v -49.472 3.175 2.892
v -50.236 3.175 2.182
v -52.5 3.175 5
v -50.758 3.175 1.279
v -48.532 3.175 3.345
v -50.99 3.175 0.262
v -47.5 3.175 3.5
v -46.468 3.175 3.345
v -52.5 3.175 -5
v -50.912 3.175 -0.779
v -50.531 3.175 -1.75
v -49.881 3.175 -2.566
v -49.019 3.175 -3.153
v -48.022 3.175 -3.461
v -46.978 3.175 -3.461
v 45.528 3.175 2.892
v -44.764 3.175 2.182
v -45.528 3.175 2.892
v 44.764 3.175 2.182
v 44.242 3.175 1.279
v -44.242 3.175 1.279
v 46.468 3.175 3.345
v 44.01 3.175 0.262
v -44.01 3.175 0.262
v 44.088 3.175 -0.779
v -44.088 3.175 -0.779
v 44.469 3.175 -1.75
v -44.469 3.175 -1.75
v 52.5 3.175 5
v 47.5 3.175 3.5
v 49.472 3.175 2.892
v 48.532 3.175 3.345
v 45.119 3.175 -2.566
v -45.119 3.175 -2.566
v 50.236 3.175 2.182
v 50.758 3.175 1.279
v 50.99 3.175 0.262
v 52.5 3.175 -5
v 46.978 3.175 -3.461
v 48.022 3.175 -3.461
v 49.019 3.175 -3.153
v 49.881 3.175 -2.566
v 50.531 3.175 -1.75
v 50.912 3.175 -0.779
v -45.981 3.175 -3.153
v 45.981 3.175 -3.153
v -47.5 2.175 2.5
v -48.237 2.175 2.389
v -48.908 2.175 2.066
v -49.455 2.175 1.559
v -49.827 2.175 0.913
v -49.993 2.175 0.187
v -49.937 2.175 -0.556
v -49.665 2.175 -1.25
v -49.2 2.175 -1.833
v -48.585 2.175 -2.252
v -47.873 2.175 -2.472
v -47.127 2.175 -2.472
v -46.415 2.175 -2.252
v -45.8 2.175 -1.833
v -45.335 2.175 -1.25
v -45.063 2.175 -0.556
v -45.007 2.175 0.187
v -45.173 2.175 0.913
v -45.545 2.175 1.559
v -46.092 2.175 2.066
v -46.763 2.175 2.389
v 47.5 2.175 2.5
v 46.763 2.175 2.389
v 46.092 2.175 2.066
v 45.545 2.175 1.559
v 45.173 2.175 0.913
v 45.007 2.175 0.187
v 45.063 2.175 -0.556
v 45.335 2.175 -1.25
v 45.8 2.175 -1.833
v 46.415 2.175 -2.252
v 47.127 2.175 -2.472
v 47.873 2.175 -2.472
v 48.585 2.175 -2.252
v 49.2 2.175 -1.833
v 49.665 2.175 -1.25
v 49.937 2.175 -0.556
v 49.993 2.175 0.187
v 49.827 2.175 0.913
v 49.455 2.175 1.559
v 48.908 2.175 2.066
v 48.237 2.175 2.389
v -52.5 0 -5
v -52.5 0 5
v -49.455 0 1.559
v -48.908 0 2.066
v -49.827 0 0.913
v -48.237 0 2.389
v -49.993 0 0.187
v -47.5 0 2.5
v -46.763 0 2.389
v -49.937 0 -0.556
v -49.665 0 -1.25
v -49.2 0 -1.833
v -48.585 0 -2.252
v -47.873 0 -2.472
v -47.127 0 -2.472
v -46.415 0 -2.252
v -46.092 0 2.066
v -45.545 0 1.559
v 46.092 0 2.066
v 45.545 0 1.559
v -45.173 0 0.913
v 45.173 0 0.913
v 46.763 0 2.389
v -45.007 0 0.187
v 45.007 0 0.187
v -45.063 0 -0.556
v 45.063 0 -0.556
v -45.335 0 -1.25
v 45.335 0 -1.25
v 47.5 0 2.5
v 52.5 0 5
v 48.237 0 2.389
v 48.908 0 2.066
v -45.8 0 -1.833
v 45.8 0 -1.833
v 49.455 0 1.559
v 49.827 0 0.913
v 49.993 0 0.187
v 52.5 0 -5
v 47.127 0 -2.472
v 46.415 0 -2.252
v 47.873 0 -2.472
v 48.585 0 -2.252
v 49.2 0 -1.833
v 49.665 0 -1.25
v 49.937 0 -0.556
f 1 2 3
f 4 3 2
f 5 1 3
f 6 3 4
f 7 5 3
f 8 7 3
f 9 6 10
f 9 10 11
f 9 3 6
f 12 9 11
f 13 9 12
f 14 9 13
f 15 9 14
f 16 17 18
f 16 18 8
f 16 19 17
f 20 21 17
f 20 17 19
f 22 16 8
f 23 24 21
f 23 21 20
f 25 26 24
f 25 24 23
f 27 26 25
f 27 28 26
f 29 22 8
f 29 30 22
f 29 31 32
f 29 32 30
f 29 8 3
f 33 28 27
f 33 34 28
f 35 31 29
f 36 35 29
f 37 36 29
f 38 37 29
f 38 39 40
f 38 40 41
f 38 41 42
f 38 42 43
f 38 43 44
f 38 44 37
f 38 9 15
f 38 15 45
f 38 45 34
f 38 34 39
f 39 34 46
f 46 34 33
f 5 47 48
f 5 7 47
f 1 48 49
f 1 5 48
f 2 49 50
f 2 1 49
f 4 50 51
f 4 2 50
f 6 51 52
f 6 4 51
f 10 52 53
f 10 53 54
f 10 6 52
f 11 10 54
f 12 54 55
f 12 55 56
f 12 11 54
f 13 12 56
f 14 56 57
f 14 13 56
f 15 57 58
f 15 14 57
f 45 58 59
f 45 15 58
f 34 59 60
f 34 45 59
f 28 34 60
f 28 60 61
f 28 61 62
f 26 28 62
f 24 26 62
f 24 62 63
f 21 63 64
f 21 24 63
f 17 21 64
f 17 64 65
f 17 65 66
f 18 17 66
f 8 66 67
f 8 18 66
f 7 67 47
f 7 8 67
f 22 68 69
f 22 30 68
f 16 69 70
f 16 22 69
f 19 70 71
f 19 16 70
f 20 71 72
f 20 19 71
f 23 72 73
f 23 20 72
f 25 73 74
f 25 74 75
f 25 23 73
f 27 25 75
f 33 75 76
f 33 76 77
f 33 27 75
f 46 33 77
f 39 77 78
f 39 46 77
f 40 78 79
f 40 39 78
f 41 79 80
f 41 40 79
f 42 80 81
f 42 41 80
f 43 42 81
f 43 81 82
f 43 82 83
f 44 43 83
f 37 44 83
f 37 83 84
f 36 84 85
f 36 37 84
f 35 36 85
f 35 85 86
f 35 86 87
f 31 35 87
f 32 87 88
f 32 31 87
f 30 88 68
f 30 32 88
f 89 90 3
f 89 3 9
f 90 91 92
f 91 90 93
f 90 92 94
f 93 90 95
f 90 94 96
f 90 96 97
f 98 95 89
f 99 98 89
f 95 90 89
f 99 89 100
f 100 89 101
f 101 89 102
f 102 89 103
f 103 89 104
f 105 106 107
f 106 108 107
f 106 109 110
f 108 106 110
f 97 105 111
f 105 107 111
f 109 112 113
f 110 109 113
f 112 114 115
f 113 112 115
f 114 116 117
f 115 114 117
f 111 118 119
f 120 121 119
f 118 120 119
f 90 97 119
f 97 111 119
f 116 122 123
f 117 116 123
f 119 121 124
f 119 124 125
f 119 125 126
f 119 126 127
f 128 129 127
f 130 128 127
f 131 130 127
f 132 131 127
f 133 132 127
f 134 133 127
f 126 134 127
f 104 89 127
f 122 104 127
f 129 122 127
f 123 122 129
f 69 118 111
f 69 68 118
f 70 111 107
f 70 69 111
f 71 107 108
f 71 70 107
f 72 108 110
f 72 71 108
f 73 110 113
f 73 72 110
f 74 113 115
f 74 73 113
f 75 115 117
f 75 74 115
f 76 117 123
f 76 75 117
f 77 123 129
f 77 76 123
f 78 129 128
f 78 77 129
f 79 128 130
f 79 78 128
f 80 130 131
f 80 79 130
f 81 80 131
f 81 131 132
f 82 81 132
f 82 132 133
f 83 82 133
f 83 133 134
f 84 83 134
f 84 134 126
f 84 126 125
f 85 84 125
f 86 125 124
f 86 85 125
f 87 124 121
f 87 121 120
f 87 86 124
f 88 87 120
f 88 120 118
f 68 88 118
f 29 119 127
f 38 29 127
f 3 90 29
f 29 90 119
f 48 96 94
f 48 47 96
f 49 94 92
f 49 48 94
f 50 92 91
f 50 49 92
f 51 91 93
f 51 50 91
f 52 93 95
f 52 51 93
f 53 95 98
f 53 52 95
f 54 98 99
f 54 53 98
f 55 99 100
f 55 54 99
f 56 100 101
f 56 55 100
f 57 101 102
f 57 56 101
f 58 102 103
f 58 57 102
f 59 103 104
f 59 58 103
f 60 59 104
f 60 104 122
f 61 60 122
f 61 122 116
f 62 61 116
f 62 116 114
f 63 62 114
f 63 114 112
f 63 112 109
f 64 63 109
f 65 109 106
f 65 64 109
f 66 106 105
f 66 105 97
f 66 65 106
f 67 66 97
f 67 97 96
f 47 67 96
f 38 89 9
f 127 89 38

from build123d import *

# Parameters (mm, degrees)
SKETCH1_W                      = 105
SKETCH1_H                      = 10
BOSS_EXTRUDE1_DEPTH            = 3.175
M6X1_0_TAPPED_HOLE1_AT_2_COUNT = 2
M6X1_0_TAPPED_HOLE1_AT_2_PITCH = 95


with BuildPart() as part:
    # Sketch1 → Boss-Extrude1 (new body)
    with BuildSketch(Plane(origin=(0, 0, 0), x_dir=(1, 0, 0), z_dir=(0, 1, 0))):
        Rectangle(SKETCH1_W, SKETCH1_H)
    extrude(amount=BOSS_EXTRUDE1_DEPTH)

    # Sketch4 → M6x1.0 Tapped Hole1 (revolve, cut)
    with BuildSketch(Plane(origin=(47.5, 3.175, 0), x_dir=(0, 0, 1), z_dir=(1, 0, 0))):
        Polygon((0, 0), (0, 3.175), (2.5, 3.175), (2.5, 1), (3.5, 0), align=None)
    m6x1_0_tapped_hole1 = revolve(axis=Axis((47.5, 9.525, 0), (0, -1, 0)), mode=Mode.SUBTRACT)

    # M6x1.0 Tapped Hole1 at 2: M6x1.0 Tapped Hole1 ×2
    with Locations(*[(-i * M6X1_0_TAPPED_HOLE1_AT_2_PITCH, 0, 0) for i in range(1, M6X1_0_TAPPED_HOLE1_AT_2_COUNT)]):
        add(m6x1_0_tapped_hole1, mode=Mode.SUBTRACT)


solid = part.part
